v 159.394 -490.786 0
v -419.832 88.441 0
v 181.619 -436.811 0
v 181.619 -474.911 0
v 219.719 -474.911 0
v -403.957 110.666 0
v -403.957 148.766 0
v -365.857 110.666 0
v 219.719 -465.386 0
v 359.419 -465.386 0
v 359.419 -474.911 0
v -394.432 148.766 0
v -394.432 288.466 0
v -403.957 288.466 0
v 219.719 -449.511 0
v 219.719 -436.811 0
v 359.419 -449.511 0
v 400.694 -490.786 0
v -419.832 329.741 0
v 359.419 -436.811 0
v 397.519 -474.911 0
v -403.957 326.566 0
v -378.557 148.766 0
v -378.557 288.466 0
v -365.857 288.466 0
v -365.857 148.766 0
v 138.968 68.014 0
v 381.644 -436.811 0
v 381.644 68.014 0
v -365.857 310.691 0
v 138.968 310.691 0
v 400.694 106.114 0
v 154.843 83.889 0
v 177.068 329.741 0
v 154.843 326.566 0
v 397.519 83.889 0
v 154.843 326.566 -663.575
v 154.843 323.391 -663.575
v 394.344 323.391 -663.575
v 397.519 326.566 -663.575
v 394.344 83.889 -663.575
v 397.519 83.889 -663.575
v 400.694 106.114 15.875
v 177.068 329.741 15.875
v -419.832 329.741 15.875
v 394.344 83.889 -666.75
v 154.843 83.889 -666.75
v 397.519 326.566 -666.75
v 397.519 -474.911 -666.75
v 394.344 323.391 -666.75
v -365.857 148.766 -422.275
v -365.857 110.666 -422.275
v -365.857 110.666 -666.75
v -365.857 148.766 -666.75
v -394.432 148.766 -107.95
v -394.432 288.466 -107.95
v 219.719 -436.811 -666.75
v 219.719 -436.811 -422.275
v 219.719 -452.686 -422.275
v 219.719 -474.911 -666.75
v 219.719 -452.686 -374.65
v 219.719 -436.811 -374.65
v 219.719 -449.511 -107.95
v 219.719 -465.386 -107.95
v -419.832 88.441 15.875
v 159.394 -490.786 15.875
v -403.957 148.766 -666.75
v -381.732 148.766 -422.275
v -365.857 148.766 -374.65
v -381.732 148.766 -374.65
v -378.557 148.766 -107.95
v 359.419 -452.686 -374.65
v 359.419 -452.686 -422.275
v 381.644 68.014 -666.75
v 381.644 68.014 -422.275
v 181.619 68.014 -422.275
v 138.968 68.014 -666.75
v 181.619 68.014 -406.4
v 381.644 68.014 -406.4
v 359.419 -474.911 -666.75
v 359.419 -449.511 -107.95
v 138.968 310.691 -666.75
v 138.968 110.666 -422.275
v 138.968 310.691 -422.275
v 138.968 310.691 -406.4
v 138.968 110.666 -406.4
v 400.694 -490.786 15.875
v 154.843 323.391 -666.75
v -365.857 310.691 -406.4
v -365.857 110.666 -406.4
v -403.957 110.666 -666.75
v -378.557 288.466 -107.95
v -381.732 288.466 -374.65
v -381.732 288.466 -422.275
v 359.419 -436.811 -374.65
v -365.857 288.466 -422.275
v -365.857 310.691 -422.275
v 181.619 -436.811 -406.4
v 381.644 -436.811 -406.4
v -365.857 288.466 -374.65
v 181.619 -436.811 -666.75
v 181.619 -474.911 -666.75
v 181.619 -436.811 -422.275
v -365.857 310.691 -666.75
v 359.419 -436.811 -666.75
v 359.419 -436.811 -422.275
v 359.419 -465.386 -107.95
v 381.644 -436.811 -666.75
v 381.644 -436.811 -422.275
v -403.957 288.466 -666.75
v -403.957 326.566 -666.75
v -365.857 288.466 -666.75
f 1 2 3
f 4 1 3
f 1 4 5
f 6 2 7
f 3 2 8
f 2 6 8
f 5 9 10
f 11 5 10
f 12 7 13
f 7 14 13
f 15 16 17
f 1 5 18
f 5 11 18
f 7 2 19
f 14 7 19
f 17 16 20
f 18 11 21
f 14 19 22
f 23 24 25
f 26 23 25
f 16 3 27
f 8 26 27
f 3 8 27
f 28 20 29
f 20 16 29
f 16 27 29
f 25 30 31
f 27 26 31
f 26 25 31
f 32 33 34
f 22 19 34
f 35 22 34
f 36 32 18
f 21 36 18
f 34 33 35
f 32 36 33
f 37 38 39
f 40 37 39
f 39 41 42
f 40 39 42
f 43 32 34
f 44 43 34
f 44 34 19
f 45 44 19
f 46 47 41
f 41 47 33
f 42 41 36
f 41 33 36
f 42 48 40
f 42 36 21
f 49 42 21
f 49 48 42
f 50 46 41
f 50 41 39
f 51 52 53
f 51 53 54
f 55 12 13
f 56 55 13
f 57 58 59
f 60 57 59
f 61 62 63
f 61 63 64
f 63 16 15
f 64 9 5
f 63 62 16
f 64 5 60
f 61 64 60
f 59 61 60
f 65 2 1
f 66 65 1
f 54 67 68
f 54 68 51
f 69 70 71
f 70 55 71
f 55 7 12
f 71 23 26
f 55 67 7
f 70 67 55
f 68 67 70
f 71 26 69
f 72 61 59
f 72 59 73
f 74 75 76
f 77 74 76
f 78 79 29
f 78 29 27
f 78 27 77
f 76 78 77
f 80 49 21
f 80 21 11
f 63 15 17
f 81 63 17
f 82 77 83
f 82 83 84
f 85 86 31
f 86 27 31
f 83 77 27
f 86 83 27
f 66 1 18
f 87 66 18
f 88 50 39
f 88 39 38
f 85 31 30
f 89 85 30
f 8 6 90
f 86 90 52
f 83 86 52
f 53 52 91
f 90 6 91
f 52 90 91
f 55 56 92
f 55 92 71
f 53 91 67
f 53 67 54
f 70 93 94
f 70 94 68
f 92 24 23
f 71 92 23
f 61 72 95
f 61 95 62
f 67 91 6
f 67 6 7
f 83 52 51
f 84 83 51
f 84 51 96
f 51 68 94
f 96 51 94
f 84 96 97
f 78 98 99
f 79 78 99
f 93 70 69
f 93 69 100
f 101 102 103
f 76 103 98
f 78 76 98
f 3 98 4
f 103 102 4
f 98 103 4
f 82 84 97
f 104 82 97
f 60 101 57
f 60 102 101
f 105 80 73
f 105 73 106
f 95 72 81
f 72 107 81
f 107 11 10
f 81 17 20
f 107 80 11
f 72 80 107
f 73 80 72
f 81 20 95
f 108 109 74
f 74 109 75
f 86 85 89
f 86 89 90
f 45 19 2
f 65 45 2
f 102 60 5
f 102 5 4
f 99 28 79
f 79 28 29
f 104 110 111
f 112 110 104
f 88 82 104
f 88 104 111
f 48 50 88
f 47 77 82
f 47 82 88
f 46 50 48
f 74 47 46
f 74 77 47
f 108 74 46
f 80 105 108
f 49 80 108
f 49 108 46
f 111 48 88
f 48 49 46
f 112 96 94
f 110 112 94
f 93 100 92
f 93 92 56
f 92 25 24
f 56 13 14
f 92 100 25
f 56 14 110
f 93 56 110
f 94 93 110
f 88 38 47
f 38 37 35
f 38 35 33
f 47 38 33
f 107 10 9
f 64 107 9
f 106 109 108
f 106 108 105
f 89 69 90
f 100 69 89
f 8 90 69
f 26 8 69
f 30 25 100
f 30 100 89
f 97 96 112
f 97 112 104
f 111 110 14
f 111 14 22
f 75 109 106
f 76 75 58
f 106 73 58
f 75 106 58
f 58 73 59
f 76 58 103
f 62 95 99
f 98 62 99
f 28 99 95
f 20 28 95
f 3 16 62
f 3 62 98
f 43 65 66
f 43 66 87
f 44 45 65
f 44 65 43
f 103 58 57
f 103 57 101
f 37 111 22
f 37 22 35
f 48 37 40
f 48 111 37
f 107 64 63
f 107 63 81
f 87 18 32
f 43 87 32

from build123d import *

# Parameters (mm, degrees)
F1_DEPTH  = 15.875
F3_DEPTH  = 666.75
F4_W      = 139.7
F4_H      = 266.7
F4_H_2    = 244.475
F5_DEPTH  = 25.4
F6_W      = 139.7
F6_H      = 47.625
F7_DEPTH  = 12.7
F8_W      = 139.7
F8_H      = 47.625
F9_DEPTH  = 12.7
F10_W     = 139.7
F10_H     = 266.7
F10_H_2   = 244.475
F11_DEPTH = 25.4
F12_W     = 139.7
F12_H     = 47.625
F13_DEPTH = 12.7
F14_W     = 139.7
F14_H     = 47.625
F15_DEPTH = 12.7
F17_DEPTH = 504.825
F19_DEPTH = 504.825
F21_DEPTH = 3.175


with BuildPart() as f1:
    # F0 (on Top) → F1 (new body)
    with BuildSketch(Plane.XY):
        Polygon((177.06789, 329.740763), (-419.83211, 329.740763), (-419.83211, 88.440763), (159.394409, -490.785757), (400.694409, -490.785757), (400.694409, 106.114243), align=None)
    extrude(amount=F1_DEPTH)

    # F2 (on face) → F3 (join)
    with BuildSketch(Plane(origin=(0, 0, 0), x_dir=(1, 0, 0), z_dir=(0, 0, -1))):
        Polygon((397.519409, 436.810757), (397.519409, 474.910757), (359.419409, 474.910757), (359.419409, 465.385757), (219.719409, 465.385757), (219.719409, 474.910757), (181.619409, 474.910757), (181.619409, 436.810757), (219.719409, 436.810757), (219.719409, 449.510757), (359.419409, 449.510757), (359.419409, 436.810757), (381.644409, 436.810757), align=None)
        Polygon((397.519409, -83.889243), (397.519409, 436.810757), (381.644409, 436.810757), (381.644409, -68.014243), (138.96789, -68.014243), (138.96789, -310.690763), (-365.85711, -310.690763), (-365.85711, -326.565763), (154.84289, -326.565763), (154.84289, -310.690763), (154.84289, -83.889243), (381.644409, -83.889243), align=None)
        Polygon((-365.85711, -326.565763), (-365.85711, -310.690763), (-365.85711, -288.465763), (-378.55711, -288.465763), (-378.55711, -148.765763), (-365.85711, -148.765763), (-365.85711, -110.665763), (-403.95711, -110.665763), (-403.95711, -148.765763), (-394.43211, -148.765763), (-394.43211, -288.465763), (-403.95711, -288.465763), (-403.95711, -326.565763), align=None)
    extrude(amount=F3_DEPTH)

    # F4 (on face) → F5 (cut)
    with BuildSketch(Plane(origin=(-394.43211, 0, 0), x_dir=(0, -1, 0), z_dir=(-1, 0, 0))):
        with Locations((-218.615763, -241.3)):
            Rectangle(F4_W, F4_H)
        with Locations((-218.615763, -544.5125)):
            Rectangle(F4_W, F4_H_2)
    extrude(amount=-F5_DEPTH, mode=Mode.SUBTRACT)

    # F6 (on face) → F7 (join)
    with BuildSketch(Plane.YZ.offset(-378.55711)):
        with Locations((218.615763, -398.4625)):
            Rectangle(F6_W, F6_H)
    extrude(amount=F7_DEPTH)

    # F8 (on face) → F9 (cut)
    with BuildSketch(Plane(origin=(-394.43211, 0, 0), x_dir=(0, -1, 0), z_dir=(-1, 0, 0))):
        with Locations((-218.615763, -398.4625)):
            Rectangle(F8_W, F8_H)
    extrude(amount=-F9_DEPTH, mode=Mode.SUBTRACT)

    # F10 (on face) → F11 (cut)
    with BuildSketch(Plane.XZ.offset(465.385757)):
        with Locations((289.569409, -241.3)):
            Rectangle(F10_W, F10_H)
        with Locations((289.569409, -544.5125)):
            Rectangle(F10_W, F10_H_2)
    extrude(amount=-F11_DEPTH, mode=Mode.SUBTRACT)

    # F12 (on face) → F13 (join)
    with BuildSketch(Plane(origin=(0, -449.510757, 0), x_dir=(-1, 0, 0), z_dir=(0, 1, 0))):
        with Locations((-289.569409, -398.4625)):
            Rectangle(F12_W, F12_H)
    extrude(amount=F13_DEPTH)

    # F14 (on face) → F15 (cut)
    with BuildSketch(Plane.XZ.offset(465.385757)):
        with Locations((289.569409, -398.4625)):
            Rectangle(F14_W, F14_H)
    extrude(amount=-F15_DEPTH, mode=Mode.SUBTRACT)

    # F16 (on face) → F17 (join)
    with BuildSketch(Plane.YZ.offset(-365.85711)):
        Polygon((148.765763, -422.275), (288.465763, -422.275), (310.690763, -422.275), (310.690763, -406.4), (110.665763, -406.4), (110.665763, -422.275), align=None)
    extrude(amount=F17_DEPTH)

    # F18 (on face) → F19 (join)
    with BuildSketch(Plane(origin=(0, -436.810757, 0), x_dir=(-1, 0, 0), z_dir=(0, 1, 0))):
        Polygon((-381.644409, -422.275), (-359.419409, -422.275), (-219.719409, -422.275), (-181.619409, -422.275), (-181.619409, -406.4), (-381.644409, -406.4), align=None)
    extrude(amount=F19_DEPTH)

    # F20 (on face) → F21 (join)
    with BuildSketch(Plane(origin=(0, 0, -666.75), x_dir=(1, 0, 0), z_dir=(0, 0, -1))):
        Polygon((154.84289, -323.390763), (154.84289, -326.565763), (397.519409, -326.565763), (397.519409, -83.889243), (394.344409, -83.889243), (394.344409, -323.390763), align=None)
    extrude(amount=-F21_DEPTH)


solid = f1.part
